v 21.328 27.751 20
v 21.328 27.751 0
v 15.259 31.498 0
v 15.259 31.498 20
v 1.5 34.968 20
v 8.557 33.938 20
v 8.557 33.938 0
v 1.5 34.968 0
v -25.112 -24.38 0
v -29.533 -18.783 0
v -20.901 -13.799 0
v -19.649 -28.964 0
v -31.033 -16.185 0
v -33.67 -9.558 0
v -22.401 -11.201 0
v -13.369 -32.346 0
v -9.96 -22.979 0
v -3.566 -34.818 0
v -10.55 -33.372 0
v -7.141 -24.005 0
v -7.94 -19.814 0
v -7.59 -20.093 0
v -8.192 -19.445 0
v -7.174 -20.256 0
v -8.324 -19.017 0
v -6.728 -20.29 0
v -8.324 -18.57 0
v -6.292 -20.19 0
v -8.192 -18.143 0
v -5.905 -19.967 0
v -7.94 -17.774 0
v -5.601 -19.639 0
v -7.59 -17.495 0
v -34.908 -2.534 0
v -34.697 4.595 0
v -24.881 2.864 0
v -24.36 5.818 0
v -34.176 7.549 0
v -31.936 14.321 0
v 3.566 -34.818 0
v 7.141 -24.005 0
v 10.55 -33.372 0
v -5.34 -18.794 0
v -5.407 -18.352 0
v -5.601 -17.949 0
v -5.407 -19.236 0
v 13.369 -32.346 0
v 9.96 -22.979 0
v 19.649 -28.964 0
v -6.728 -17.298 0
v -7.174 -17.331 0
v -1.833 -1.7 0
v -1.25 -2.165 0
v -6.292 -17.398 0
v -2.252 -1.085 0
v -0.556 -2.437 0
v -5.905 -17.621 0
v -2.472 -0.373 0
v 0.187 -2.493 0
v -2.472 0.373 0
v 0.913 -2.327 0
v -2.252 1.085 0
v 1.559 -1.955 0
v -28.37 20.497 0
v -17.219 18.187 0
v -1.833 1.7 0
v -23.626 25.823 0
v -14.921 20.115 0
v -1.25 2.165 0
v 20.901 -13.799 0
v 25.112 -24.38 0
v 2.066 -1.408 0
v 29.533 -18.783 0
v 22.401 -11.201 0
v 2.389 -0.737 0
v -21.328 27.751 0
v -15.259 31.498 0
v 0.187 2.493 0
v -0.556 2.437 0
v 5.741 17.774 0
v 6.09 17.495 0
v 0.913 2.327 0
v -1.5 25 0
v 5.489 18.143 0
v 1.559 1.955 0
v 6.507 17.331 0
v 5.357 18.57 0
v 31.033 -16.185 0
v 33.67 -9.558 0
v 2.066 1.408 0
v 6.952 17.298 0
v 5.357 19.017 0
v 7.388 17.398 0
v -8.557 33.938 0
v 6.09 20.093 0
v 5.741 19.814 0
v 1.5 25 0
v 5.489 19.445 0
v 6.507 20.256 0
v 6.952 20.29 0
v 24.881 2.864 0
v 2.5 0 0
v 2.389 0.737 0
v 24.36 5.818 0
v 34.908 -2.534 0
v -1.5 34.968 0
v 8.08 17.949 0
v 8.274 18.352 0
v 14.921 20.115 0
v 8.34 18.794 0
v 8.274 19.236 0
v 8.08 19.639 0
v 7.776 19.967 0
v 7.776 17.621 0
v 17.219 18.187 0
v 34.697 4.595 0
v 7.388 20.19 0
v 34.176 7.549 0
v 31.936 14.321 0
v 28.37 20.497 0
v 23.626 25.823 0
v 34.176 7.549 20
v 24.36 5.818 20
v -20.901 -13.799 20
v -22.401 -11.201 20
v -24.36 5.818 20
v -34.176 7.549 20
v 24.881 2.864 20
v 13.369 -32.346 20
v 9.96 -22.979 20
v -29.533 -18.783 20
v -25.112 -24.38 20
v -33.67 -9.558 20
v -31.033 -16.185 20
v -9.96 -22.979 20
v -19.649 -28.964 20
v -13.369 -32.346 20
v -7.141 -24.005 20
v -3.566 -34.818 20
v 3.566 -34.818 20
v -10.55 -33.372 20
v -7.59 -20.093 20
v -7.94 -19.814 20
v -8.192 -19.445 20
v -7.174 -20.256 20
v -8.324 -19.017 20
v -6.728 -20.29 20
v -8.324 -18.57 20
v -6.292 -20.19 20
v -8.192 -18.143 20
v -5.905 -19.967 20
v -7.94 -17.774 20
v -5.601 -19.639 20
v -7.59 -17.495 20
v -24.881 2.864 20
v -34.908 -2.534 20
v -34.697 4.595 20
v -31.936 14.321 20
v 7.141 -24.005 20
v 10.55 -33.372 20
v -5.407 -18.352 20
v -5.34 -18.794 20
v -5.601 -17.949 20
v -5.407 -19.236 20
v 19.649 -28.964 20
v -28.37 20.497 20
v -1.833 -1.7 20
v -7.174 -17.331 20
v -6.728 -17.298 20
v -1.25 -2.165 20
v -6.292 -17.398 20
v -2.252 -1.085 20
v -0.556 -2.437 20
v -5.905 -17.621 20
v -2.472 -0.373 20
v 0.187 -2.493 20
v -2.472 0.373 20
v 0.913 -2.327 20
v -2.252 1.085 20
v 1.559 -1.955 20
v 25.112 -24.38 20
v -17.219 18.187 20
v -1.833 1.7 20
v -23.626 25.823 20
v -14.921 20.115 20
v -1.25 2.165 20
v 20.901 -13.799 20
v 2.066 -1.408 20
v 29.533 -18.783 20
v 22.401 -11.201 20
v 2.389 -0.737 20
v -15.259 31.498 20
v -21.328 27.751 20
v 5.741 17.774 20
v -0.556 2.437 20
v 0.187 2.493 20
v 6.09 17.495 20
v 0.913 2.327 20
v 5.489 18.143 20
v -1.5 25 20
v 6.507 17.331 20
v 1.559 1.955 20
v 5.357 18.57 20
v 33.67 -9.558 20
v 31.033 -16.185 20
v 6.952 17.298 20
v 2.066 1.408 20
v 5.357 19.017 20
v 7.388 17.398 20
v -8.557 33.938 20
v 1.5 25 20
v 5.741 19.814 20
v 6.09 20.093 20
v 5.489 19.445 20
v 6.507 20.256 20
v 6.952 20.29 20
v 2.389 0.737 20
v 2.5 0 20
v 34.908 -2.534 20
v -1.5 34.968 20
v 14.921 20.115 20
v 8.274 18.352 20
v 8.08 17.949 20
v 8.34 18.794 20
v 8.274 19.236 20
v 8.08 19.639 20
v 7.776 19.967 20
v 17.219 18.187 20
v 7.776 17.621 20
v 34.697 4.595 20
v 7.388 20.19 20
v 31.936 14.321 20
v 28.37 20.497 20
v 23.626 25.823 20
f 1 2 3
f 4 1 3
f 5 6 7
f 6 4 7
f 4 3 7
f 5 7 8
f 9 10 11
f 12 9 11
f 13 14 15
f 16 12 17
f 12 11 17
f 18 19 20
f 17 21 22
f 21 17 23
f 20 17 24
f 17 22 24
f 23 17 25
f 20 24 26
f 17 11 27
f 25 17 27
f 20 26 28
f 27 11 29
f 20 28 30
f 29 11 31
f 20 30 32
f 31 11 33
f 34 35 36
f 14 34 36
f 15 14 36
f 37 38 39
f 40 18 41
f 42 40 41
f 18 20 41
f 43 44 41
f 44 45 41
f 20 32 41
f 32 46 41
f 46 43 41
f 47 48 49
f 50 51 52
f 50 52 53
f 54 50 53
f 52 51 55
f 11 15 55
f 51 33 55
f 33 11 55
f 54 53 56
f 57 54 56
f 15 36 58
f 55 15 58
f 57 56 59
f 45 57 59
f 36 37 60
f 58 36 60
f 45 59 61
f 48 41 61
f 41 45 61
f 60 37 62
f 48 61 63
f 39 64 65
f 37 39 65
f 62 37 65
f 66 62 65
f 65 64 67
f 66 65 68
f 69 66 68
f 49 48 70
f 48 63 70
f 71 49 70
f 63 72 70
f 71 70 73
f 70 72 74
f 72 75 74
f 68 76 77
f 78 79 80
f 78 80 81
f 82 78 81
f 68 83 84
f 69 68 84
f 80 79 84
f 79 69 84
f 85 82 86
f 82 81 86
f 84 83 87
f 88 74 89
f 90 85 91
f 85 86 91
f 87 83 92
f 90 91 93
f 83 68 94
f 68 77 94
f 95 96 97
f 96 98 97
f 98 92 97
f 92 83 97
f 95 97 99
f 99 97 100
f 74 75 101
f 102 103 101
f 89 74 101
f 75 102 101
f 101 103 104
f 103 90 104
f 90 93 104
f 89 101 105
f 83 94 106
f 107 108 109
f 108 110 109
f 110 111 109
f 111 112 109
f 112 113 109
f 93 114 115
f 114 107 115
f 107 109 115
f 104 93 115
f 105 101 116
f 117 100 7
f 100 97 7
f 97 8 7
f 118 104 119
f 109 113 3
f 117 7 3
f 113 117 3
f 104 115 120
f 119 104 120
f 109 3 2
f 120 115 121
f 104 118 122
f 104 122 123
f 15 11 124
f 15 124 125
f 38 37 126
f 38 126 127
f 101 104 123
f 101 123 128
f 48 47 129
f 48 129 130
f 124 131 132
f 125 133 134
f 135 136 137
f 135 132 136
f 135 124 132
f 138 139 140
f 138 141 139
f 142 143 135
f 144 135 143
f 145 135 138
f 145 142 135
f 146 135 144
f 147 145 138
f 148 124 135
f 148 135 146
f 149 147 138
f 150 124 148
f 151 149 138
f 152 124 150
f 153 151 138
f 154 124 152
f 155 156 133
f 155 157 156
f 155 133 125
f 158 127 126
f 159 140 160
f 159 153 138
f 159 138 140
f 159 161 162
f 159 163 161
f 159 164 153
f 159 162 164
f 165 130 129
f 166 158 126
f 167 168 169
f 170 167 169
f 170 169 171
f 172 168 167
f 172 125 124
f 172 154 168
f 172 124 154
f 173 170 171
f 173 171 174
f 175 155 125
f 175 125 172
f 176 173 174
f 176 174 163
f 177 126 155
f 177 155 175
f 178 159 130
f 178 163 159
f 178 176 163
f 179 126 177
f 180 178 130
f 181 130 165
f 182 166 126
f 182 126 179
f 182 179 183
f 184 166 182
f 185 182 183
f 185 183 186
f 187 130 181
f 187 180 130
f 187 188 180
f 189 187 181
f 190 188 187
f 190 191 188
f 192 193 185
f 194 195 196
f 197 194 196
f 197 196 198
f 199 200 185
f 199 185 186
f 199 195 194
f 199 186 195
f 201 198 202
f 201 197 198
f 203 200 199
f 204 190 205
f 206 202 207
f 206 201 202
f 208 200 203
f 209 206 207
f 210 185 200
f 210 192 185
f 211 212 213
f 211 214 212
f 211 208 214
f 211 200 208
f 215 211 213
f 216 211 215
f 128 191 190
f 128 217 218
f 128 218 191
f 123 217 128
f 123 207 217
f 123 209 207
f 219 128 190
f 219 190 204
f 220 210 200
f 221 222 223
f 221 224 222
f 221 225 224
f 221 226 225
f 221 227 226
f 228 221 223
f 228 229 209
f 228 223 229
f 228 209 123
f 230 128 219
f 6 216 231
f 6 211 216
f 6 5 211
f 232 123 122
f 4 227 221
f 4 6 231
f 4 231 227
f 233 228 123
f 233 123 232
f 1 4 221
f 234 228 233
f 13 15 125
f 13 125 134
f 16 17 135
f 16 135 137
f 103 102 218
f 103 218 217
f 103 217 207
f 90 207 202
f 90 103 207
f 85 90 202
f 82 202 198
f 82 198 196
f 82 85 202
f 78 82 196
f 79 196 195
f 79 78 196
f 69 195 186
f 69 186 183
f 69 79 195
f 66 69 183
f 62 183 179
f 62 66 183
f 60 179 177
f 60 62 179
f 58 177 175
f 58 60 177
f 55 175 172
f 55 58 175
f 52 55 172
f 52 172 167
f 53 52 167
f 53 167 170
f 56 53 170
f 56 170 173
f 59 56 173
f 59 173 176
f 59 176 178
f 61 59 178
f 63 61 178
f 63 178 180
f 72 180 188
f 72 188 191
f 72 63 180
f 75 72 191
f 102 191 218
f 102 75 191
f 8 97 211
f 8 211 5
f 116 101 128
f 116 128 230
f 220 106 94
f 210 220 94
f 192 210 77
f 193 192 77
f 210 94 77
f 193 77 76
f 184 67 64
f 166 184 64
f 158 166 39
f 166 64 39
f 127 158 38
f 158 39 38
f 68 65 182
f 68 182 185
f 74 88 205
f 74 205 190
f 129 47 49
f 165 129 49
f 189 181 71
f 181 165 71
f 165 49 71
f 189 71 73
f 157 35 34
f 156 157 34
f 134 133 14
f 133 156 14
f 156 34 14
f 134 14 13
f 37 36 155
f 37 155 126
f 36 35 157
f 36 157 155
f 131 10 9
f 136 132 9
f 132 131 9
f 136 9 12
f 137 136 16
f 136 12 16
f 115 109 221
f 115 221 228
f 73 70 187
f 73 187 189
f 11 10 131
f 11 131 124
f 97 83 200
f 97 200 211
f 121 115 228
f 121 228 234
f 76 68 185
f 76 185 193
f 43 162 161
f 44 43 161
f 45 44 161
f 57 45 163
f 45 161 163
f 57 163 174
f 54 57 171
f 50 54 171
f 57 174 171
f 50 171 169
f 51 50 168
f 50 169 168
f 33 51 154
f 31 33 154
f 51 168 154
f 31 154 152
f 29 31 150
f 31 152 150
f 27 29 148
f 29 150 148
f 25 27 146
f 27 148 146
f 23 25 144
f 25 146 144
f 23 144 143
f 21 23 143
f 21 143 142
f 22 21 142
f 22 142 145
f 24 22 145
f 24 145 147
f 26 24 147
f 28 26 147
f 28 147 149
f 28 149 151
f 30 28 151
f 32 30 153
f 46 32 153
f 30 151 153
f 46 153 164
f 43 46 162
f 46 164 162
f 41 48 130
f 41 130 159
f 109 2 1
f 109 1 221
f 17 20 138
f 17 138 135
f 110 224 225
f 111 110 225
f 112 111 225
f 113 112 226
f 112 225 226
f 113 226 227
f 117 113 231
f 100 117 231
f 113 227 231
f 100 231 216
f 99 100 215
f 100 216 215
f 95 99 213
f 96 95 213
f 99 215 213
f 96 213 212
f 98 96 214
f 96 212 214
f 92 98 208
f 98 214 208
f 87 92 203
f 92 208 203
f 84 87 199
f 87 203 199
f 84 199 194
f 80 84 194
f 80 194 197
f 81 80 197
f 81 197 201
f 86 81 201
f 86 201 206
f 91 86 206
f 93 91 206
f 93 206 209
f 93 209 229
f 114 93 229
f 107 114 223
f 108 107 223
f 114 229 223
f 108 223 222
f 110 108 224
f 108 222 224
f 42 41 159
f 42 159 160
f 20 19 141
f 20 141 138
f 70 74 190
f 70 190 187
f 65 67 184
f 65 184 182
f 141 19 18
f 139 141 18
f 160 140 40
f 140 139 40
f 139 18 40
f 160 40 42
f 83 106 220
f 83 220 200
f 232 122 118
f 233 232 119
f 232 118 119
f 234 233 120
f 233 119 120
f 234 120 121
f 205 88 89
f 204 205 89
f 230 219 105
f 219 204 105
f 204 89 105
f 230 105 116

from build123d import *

# Parameters (mm, degrees)
SKETCH_1_R               = 35
SKETCH_1_R_2             = 2.5
EXTRUDE_1_DEPTH          = 20
CUT_EXTRUDE_START        = -20
CUT_EXTRUDE_1_DEPTH      = 20
PATTERN_CIRCULAR_1_COUNT = 9
SKETCH_3_R               = 1.5
CUT_EXTRUDE_2_DEPTH      = 20


with BuildPart() as part:
    # 草图1 → 凸台-拉伸1 (new body)
    with BuildSketch(Plane.XY):
        Circle(SKETCH_1_R)
        Circle(SKETCH_1_R_2, mode=Mode.SUBTRACT)
    extrude(amount=EXTRUDE_1_DEPTH)

    # 草图2 → 切除-拉伸1 (cut)
    with BuildSketch(Plane.XY.offset(20).offset(CUT_EXTRUDE_START)):
        with BuildLine():
            Line((-1.5, 25), (1.5, 25))
            Line((1.5, 25), (1.5, 34.96784237))
            ThreePointArc((1.5, 34.96784237), (0, 35), (-1.5, 34.96784237))
            Line((-1.5, 34.96784237), (-1.5, 25))
        make_face()
    cut_extrude_1 = extrude(amount=CUT_EXTRUDE_1_DEPTH, mode=Mode.SUBTRACT)

    # 阵列(圆周)1: 切除-拉伸1 ×9 about axis
    pattern_circular_1_axis = Axis((0, 0, 0), (0, 0, 1))
    for i in range(1, PATTERN_CIRCULAR_1_COUNT):
        add(cut_extrude_1.rotate(pattern_circular_1_axis, i * 360 / PATTERN_CIRCULAR_1_COUNT), mode=Mode.SUBTRACT)

    # 草图3 → 切除-拉伸2 (cut)
    with BuildSketch(Plane.XY.offset(20)):
        with Locations((6.840402867, 18.793852416)):
            Circle(SKETCH_3_R)
        with Locations((-6.840402867, -18.793852416)):
            Circle(SKETCH_3_R)
    extrude(amount=-CUT_EXTRUDE_2_DEPTH, mode=Mode.SUBTRACT)


solid = part.part
